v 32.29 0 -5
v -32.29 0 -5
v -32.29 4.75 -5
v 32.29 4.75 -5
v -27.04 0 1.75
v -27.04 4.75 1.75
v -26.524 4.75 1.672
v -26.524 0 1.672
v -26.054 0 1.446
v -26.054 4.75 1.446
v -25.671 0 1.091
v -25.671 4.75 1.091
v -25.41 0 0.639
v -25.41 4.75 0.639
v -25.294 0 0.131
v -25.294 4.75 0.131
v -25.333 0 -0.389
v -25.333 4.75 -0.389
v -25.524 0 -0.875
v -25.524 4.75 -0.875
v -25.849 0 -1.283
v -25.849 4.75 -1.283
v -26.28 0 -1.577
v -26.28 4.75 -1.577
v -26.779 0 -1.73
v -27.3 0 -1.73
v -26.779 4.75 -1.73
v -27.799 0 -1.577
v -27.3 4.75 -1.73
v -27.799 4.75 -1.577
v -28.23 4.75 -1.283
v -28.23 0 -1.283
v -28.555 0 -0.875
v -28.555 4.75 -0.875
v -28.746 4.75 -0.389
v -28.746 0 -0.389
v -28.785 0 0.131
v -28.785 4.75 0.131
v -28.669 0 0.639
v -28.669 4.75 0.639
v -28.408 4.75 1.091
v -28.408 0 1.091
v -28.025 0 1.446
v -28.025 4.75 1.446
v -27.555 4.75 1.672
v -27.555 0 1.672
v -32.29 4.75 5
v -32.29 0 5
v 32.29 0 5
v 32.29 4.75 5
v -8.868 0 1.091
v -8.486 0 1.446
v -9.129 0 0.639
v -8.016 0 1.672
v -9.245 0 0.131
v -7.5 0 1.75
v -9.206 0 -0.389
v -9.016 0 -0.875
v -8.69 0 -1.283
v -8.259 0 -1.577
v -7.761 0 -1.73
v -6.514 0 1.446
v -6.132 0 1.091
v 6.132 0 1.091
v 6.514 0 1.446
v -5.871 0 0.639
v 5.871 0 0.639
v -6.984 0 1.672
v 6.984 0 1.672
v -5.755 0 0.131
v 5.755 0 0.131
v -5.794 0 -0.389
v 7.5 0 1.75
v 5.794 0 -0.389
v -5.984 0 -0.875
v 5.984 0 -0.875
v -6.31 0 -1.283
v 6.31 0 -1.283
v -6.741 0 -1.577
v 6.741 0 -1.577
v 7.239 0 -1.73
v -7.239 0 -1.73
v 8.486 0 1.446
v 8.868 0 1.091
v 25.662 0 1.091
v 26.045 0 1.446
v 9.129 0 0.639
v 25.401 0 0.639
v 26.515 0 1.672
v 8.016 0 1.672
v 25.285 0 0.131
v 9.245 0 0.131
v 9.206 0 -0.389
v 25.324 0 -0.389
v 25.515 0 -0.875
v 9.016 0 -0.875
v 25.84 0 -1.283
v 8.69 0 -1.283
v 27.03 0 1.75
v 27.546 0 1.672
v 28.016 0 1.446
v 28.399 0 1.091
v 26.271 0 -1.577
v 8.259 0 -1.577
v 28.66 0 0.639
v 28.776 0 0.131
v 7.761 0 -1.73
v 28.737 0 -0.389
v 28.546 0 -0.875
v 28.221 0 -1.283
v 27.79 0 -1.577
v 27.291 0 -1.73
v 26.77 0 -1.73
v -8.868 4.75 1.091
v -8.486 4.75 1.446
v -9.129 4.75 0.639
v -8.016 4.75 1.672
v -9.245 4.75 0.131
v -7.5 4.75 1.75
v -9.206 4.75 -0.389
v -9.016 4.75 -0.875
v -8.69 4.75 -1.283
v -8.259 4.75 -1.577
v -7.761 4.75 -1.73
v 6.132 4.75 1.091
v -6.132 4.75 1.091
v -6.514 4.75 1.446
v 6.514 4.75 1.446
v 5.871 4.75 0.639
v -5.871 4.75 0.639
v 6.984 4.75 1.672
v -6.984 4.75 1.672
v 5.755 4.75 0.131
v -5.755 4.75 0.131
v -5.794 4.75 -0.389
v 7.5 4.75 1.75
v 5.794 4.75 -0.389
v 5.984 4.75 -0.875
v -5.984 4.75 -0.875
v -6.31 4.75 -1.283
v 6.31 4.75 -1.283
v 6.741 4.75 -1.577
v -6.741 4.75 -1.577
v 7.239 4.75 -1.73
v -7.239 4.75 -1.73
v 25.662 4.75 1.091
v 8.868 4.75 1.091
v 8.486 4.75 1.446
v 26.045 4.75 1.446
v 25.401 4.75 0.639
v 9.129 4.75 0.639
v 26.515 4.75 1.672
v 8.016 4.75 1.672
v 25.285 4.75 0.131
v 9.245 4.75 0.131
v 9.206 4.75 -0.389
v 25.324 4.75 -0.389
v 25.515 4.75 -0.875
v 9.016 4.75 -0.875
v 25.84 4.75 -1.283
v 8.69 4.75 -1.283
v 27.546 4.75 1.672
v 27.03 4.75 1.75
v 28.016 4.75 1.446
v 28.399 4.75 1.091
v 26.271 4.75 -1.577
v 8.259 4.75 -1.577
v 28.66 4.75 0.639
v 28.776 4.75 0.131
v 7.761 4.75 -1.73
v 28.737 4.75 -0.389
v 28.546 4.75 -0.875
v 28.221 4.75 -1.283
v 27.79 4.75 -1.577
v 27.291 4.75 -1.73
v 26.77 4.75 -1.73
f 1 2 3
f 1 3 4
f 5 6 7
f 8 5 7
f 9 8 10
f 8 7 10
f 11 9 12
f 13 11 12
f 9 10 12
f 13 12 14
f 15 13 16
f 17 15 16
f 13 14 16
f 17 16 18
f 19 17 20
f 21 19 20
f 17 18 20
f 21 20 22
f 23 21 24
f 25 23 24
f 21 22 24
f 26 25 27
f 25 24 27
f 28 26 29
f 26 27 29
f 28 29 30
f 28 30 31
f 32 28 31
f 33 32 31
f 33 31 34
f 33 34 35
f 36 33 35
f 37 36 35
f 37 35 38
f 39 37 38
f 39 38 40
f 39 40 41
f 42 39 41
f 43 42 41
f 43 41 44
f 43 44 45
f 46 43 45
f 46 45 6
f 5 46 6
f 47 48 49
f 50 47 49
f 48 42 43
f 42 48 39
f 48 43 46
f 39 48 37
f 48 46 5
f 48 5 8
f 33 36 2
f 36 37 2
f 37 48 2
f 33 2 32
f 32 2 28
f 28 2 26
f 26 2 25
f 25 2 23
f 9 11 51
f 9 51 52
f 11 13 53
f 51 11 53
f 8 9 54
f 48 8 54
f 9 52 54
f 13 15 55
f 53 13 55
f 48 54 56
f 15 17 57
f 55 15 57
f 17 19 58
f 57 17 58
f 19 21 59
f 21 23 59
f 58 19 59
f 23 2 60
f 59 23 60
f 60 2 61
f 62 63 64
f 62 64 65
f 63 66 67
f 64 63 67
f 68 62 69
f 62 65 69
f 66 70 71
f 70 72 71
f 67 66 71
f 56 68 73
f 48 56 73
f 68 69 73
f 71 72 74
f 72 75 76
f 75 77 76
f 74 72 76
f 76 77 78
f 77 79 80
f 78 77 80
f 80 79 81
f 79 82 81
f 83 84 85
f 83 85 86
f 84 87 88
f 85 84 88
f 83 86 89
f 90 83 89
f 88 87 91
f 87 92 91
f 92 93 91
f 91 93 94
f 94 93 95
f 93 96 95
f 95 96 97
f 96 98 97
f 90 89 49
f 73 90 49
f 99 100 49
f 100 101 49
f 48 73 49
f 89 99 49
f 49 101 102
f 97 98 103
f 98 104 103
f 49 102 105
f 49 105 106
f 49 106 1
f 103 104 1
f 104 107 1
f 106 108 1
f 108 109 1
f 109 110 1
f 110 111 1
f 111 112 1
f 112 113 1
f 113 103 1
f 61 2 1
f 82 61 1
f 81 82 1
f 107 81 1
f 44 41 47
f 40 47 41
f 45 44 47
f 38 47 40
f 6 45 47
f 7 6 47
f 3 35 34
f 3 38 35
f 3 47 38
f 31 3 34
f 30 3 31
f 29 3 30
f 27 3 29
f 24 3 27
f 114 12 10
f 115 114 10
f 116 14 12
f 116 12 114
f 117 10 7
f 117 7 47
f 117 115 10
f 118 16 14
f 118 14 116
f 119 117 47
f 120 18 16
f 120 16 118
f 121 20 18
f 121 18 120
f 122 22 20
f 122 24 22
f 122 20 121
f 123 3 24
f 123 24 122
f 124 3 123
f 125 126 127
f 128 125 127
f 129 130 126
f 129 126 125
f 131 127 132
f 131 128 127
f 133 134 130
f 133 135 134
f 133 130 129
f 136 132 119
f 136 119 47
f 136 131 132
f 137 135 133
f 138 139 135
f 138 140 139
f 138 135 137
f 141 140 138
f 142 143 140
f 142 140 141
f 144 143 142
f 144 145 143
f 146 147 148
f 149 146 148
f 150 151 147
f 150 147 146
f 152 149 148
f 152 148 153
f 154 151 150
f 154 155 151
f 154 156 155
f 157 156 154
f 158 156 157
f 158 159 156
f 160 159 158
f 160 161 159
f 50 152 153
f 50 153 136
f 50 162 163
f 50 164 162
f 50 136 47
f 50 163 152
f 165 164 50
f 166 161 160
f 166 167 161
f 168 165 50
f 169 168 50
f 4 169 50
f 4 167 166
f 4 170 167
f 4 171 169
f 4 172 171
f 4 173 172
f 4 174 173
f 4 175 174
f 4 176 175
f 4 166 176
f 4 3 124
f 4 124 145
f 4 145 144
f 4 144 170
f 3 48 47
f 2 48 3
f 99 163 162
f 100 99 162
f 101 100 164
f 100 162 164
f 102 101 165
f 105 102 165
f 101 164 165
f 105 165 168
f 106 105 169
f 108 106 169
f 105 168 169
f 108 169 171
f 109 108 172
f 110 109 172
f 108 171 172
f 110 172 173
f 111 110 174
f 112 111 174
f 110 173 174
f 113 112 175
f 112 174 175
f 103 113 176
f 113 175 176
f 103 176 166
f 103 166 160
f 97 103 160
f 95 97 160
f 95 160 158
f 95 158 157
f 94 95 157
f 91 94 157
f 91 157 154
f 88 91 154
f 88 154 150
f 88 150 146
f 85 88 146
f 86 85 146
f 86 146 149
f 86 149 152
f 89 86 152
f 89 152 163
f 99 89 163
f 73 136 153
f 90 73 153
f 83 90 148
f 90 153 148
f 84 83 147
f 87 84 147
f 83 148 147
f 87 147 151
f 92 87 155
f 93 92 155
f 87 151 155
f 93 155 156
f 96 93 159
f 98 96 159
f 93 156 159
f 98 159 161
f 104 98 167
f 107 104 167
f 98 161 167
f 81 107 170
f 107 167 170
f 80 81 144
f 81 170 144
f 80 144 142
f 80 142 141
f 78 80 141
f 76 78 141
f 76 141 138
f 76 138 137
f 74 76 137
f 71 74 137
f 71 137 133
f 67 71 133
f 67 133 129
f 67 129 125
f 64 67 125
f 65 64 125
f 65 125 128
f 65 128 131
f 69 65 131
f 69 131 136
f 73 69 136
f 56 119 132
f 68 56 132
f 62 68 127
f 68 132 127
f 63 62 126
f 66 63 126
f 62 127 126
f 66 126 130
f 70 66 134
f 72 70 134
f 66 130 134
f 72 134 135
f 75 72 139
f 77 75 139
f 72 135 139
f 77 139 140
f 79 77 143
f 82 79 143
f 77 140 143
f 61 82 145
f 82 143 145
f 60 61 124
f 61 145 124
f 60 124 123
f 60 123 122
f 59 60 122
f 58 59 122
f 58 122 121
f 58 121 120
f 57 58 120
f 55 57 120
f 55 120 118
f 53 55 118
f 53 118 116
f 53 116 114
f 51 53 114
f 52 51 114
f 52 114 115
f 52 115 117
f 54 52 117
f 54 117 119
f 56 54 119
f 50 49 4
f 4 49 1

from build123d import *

# Parameters (mm, degrees)
SKETCH_V_W          = 64.58
SKETCH_V_H          = 10
BOSS_EXTRUDE1_DEPTH = 4.75
SKETCH2_R           = 1.75
CUT_EXTRUDE1_DEPTH  = 34.018276757


with BuildPart() as part:
    # Sketch v → Boss-Extrude1 (new body)
    with BuildSketch(Plane(origin=(0, 0, 0), x_dir=(1, 0, 0), z_dir=(0, 1, 0))):
        Rectangle(SKETCH_V_W, SKETCH_V_H)
    extrude(amount=BOSS_EXTRUDE1_DEPTH)

    # Sketch2 → Cut-Extrude1 (cut, through all)
    with BuildSketch(Plane(origin=(0, 4.75, 0), x_dir=(1, 0, 0), z_dir=(0, 1, 0))):
        with Locations(Location((-27.0395, 0, 0), (0, 0, 270))):
            Circle(SKETCH2_R)
        with Locations(Location((27.0305, 0, 0), (0, 0, 270))):
            Circle(SKETCH2_R)
        with Locations(Location((7.5, 0, 0), (0, 0, 270))):
            Circle(SKETCH2_R)
        with Locations(Location((-7.5, 0, 0), (0, 0, 270))):
            Circle(SKETCH2_R)
    extrude(amount=-CUT_EXTRUDE1_DEPTH, mode=Mode.SUBTRACT)


solid = part.part
